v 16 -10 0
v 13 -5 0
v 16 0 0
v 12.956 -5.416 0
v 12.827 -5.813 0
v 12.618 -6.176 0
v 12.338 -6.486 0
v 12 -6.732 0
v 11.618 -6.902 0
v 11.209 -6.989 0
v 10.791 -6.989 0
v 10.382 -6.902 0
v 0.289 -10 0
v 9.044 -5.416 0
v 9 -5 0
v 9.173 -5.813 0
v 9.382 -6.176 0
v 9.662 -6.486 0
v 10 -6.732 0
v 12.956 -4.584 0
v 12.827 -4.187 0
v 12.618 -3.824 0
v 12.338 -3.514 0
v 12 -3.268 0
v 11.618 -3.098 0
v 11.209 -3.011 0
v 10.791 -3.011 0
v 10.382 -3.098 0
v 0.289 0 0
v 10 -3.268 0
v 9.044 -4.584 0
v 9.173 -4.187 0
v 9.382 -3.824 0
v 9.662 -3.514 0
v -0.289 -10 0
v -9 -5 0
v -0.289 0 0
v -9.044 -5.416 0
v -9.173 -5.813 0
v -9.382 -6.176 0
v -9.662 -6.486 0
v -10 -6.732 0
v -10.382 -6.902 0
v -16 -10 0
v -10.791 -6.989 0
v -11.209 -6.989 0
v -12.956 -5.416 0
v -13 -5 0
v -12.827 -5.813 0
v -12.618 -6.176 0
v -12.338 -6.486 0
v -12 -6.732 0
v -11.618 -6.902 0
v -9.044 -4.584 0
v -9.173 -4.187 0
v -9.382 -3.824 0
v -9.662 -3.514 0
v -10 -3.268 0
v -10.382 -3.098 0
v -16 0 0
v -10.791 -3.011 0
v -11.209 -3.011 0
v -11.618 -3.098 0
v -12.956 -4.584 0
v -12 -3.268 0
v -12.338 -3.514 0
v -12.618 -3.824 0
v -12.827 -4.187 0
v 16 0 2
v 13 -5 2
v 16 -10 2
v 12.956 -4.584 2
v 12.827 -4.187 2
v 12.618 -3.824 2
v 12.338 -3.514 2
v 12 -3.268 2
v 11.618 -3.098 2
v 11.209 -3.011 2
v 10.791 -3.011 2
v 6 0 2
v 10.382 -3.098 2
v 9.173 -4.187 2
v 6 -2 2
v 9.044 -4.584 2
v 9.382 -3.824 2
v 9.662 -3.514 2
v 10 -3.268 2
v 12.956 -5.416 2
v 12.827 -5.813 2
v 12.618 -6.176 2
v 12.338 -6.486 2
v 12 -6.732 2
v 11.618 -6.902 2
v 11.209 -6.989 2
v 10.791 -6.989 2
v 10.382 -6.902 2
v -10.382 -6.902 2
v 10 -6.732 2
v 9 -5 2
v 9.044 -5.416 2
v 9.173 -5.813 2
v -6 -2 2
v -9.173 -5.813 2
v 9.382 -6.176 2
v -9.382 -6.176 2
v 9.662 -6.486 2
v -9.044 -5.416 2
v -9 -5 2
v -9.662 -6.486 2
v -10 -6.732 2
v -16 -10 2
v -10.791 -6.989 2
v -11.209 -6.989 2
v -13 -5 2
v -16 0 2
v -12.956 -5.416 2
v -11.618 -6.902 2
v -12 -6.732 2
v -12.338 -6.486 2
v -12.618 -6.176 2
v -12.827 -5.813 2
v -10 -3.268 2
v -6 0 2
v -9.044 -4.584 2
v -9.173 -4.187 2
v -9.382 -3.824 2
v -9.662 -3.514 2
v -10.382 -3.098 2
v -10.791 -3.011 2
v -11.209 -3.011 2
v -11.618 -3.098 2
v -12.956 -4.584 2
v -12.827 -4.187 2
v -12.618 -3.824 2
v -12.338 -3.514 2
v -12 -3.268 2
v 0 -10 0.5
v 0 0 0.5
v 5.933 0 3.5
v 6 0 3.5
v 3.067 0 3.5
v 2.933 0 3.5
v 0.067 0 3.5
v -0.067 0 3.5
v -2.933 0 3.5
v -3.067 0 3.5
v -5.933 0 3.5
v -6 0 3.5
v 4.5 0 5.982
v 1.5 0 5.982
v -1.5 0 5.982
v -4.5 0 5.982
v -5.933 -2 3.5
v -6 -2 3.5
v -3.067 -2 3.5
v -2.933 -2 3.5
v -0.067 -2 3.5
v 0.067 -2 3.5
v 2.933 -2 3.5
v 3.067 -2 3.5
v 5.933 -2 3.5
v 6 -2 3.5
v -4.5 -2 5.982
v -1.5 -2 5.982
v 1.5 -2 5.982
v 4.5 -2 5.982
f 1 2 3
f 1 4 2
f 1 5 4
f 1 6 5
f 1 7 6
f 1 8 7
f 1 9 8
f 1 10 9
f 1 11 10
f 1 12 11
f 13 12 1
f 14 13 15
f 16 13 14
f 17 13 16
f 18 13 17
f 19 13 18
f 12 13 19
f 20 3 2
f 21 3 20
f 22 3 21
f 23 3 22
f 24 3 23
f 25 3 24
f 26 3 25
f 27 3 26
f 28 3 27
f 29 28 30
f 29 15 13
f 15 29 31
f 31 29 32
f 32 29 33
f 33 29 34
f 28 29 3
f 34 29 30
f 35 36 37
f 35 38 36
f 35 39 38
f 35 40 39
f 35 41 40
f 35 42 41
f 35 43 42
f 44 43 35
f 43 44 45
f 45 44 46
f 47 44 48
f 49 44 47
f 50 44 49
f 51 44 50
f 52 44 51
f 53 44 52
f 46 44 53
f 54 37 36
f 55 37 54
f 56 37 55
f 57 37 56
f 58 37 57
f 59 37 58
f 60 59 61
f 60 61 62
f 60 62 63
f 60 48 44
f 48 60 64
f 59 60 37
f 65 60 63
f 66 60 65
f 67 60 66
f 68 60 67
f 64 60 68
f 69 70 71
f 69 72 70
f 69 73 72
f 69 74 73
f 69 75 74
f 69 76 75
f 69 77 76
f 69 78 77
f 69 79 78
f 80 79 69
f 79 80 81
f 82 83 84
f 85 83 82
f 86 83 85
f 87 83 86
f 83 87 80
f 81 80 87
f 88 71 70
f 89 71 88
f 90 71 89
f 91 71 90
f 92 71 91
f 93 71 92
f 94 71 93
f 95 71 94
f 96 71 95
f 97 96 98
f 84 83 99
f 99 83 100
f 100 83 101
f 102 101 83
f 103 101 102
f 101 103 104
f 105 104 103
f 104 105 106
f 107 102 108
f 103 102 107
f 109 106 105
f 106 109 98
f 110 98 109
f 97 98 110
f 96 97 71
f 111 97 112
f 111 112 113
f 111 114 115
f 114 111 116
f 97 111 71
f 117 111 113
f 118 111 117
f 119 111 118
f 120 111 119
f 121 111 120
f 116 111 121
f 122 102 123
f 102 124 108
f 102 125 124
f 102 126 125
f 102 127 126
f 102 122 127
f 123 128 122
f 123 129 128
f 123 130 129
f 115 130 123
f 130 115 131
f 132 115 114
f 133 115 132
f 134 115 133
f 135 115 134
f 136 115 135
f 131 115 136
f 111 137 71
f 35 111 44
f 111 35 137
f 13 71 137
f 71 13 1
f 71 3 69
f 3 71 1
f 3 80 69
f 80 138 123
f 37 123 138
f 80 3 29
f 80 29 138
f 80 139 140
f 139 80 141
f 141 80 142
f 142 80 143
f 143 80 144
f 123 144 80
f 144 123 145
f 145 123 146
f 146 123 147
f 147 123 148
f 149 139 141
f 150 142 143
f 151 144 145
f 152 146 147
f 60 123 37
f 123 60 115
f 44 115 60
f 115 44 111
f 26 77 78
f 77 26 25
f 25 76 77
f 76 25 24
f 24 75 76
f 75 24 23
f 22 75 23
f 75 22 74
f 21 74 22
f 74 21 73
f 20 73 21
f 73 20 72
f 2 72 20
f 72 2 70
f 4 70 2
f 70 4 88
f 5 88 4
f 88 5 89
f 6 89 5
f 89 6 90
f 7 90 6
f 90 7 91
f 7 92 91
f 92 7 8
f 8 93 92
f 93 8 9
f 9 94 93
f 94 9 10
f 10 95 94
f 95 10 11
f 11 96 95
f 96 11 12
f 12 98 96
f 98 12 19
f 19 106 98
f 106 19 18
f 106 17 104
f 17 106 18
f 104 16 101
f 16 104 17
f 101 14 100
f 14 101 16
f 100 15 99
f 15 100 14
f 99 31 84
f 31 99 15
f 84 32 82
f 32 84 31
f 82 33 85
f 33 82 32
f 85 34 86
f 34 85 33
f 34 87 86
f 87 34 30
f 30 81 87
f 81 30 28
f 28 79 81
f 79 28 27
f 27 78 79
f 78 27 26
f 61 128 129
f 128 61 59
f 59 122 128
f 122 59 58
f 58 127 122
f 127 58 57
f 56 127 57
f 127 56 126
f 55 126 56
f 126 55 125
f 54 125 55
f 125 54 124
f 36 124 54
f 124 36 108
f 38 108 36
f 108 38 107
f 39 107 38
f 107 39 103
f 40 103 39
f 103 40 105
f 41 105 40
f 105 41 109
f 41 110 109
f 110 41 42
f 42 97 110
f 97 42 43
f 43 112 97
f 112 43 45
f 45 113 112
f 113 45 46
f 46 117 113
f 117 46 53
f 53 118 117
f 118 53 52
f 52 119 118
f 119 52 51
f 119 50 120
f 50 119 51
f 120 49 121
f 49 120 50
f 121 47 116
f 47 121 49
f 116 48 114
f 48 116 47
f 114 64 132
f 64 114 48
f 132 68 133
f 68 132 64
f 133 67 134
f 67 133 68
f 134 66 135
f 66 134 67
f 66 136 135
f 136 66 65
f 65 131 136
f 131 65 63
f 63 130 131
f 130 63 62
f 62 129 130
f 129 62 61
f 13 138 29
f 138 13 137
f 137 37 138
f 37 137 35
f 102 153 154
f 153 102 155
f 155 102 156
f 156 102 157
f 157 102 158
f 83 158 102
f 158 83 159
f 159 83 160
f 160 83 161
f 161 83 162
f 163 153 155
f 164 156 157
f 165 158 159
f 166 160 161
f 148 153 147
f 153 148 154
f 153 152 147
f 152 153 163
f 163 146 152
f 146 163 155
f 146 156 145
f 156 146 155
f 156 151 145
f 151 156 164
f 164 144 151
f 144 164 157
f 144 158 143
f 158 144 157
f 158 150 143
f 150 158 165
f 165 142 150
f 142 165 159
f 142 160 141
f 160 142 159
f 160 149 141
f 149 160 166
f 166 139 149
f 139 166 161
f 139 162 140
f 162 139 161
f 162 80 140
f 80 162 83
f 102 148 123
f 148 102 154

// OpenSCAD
//
// Box-framed picture hanging tool
// version 1.0   05/03/2016
// by Matthew Flint (mkflint @ Thingiverse)
//

/* [Main] */
// thickness of the walls
thickness = 2; // [3:8]
// depth; limited by the distance between the canvas and the wall
depth = 10; // [8:20]
// height of the teeth (from the base to the tip of the tooth)
teeth_height = 3; // [2:20]
// number of teeth. Even number!
number_of_teeth = 4; // [2:10]
// width of each tooth
tooth_width = 3; // [2:10]
// diameter of the screw hole
hole_diameter = 4; // [2:10];

/* [Hidden] */
teeth_width = number_of_teeth * tooth_width;
width = teeth_width + (depth * 2);

main();

module main()
{
  render(convexity = 3)
  rotate([0,0,180])
  translate([-width * 0.5, 0, 0])
    union()
    {
      flat_bit();
      teeth();
    }
}

module flat_bit()
{
  difference()
  {
    linear_extrude(thickness)
      flat_bit_shape();
    centre_notch();
  }
}

module flat_bit_shape()
{
  difference()
  {
    square(size=[width,depth]);
    translate([depth*0.5, depth*0.5])
      circle(d=hole_diameter, $fn = 30);
    translate([width - (depth*0.5), depth*0.5])
      circle(d=hole_diameter, $fn = 30);
  }
}

module centre_notch()
{
  translate([width*0.5, 0, 0])
  rotate([-90,0,0])
  linear_extrude(depth)
  {
    rotate([0,0,30])
    circle(d=1, $fn=3);
  }
}

module teeth()
{
  translate([(width-teeth_width)/2,thickness,thickness])
    rotate([90,0,0])
      linear_extrude(thickness)
        teeth_shape();
}

module teeth_shape()
{
  rectangle_height = teeth_height - (tooth_width * cos(60));
  x_offset = (tooth_width * 0.5) + teeth_width - (tooth_width * number_of_teeth);
  y_offset = teeth_height - (tooth_width * cos(60) * 0.5);

  union()
  {
    square(size=[teeth_width,rectangle_height]);
    for (i=[0:number_of_teeth-1]) {
      translate([x_offset + (tooth_width * i), y_offset])
        rotate([0,0,-30])
          circle(d=tooth_width / sin(60), $fn = 3);
    }

  }
}
